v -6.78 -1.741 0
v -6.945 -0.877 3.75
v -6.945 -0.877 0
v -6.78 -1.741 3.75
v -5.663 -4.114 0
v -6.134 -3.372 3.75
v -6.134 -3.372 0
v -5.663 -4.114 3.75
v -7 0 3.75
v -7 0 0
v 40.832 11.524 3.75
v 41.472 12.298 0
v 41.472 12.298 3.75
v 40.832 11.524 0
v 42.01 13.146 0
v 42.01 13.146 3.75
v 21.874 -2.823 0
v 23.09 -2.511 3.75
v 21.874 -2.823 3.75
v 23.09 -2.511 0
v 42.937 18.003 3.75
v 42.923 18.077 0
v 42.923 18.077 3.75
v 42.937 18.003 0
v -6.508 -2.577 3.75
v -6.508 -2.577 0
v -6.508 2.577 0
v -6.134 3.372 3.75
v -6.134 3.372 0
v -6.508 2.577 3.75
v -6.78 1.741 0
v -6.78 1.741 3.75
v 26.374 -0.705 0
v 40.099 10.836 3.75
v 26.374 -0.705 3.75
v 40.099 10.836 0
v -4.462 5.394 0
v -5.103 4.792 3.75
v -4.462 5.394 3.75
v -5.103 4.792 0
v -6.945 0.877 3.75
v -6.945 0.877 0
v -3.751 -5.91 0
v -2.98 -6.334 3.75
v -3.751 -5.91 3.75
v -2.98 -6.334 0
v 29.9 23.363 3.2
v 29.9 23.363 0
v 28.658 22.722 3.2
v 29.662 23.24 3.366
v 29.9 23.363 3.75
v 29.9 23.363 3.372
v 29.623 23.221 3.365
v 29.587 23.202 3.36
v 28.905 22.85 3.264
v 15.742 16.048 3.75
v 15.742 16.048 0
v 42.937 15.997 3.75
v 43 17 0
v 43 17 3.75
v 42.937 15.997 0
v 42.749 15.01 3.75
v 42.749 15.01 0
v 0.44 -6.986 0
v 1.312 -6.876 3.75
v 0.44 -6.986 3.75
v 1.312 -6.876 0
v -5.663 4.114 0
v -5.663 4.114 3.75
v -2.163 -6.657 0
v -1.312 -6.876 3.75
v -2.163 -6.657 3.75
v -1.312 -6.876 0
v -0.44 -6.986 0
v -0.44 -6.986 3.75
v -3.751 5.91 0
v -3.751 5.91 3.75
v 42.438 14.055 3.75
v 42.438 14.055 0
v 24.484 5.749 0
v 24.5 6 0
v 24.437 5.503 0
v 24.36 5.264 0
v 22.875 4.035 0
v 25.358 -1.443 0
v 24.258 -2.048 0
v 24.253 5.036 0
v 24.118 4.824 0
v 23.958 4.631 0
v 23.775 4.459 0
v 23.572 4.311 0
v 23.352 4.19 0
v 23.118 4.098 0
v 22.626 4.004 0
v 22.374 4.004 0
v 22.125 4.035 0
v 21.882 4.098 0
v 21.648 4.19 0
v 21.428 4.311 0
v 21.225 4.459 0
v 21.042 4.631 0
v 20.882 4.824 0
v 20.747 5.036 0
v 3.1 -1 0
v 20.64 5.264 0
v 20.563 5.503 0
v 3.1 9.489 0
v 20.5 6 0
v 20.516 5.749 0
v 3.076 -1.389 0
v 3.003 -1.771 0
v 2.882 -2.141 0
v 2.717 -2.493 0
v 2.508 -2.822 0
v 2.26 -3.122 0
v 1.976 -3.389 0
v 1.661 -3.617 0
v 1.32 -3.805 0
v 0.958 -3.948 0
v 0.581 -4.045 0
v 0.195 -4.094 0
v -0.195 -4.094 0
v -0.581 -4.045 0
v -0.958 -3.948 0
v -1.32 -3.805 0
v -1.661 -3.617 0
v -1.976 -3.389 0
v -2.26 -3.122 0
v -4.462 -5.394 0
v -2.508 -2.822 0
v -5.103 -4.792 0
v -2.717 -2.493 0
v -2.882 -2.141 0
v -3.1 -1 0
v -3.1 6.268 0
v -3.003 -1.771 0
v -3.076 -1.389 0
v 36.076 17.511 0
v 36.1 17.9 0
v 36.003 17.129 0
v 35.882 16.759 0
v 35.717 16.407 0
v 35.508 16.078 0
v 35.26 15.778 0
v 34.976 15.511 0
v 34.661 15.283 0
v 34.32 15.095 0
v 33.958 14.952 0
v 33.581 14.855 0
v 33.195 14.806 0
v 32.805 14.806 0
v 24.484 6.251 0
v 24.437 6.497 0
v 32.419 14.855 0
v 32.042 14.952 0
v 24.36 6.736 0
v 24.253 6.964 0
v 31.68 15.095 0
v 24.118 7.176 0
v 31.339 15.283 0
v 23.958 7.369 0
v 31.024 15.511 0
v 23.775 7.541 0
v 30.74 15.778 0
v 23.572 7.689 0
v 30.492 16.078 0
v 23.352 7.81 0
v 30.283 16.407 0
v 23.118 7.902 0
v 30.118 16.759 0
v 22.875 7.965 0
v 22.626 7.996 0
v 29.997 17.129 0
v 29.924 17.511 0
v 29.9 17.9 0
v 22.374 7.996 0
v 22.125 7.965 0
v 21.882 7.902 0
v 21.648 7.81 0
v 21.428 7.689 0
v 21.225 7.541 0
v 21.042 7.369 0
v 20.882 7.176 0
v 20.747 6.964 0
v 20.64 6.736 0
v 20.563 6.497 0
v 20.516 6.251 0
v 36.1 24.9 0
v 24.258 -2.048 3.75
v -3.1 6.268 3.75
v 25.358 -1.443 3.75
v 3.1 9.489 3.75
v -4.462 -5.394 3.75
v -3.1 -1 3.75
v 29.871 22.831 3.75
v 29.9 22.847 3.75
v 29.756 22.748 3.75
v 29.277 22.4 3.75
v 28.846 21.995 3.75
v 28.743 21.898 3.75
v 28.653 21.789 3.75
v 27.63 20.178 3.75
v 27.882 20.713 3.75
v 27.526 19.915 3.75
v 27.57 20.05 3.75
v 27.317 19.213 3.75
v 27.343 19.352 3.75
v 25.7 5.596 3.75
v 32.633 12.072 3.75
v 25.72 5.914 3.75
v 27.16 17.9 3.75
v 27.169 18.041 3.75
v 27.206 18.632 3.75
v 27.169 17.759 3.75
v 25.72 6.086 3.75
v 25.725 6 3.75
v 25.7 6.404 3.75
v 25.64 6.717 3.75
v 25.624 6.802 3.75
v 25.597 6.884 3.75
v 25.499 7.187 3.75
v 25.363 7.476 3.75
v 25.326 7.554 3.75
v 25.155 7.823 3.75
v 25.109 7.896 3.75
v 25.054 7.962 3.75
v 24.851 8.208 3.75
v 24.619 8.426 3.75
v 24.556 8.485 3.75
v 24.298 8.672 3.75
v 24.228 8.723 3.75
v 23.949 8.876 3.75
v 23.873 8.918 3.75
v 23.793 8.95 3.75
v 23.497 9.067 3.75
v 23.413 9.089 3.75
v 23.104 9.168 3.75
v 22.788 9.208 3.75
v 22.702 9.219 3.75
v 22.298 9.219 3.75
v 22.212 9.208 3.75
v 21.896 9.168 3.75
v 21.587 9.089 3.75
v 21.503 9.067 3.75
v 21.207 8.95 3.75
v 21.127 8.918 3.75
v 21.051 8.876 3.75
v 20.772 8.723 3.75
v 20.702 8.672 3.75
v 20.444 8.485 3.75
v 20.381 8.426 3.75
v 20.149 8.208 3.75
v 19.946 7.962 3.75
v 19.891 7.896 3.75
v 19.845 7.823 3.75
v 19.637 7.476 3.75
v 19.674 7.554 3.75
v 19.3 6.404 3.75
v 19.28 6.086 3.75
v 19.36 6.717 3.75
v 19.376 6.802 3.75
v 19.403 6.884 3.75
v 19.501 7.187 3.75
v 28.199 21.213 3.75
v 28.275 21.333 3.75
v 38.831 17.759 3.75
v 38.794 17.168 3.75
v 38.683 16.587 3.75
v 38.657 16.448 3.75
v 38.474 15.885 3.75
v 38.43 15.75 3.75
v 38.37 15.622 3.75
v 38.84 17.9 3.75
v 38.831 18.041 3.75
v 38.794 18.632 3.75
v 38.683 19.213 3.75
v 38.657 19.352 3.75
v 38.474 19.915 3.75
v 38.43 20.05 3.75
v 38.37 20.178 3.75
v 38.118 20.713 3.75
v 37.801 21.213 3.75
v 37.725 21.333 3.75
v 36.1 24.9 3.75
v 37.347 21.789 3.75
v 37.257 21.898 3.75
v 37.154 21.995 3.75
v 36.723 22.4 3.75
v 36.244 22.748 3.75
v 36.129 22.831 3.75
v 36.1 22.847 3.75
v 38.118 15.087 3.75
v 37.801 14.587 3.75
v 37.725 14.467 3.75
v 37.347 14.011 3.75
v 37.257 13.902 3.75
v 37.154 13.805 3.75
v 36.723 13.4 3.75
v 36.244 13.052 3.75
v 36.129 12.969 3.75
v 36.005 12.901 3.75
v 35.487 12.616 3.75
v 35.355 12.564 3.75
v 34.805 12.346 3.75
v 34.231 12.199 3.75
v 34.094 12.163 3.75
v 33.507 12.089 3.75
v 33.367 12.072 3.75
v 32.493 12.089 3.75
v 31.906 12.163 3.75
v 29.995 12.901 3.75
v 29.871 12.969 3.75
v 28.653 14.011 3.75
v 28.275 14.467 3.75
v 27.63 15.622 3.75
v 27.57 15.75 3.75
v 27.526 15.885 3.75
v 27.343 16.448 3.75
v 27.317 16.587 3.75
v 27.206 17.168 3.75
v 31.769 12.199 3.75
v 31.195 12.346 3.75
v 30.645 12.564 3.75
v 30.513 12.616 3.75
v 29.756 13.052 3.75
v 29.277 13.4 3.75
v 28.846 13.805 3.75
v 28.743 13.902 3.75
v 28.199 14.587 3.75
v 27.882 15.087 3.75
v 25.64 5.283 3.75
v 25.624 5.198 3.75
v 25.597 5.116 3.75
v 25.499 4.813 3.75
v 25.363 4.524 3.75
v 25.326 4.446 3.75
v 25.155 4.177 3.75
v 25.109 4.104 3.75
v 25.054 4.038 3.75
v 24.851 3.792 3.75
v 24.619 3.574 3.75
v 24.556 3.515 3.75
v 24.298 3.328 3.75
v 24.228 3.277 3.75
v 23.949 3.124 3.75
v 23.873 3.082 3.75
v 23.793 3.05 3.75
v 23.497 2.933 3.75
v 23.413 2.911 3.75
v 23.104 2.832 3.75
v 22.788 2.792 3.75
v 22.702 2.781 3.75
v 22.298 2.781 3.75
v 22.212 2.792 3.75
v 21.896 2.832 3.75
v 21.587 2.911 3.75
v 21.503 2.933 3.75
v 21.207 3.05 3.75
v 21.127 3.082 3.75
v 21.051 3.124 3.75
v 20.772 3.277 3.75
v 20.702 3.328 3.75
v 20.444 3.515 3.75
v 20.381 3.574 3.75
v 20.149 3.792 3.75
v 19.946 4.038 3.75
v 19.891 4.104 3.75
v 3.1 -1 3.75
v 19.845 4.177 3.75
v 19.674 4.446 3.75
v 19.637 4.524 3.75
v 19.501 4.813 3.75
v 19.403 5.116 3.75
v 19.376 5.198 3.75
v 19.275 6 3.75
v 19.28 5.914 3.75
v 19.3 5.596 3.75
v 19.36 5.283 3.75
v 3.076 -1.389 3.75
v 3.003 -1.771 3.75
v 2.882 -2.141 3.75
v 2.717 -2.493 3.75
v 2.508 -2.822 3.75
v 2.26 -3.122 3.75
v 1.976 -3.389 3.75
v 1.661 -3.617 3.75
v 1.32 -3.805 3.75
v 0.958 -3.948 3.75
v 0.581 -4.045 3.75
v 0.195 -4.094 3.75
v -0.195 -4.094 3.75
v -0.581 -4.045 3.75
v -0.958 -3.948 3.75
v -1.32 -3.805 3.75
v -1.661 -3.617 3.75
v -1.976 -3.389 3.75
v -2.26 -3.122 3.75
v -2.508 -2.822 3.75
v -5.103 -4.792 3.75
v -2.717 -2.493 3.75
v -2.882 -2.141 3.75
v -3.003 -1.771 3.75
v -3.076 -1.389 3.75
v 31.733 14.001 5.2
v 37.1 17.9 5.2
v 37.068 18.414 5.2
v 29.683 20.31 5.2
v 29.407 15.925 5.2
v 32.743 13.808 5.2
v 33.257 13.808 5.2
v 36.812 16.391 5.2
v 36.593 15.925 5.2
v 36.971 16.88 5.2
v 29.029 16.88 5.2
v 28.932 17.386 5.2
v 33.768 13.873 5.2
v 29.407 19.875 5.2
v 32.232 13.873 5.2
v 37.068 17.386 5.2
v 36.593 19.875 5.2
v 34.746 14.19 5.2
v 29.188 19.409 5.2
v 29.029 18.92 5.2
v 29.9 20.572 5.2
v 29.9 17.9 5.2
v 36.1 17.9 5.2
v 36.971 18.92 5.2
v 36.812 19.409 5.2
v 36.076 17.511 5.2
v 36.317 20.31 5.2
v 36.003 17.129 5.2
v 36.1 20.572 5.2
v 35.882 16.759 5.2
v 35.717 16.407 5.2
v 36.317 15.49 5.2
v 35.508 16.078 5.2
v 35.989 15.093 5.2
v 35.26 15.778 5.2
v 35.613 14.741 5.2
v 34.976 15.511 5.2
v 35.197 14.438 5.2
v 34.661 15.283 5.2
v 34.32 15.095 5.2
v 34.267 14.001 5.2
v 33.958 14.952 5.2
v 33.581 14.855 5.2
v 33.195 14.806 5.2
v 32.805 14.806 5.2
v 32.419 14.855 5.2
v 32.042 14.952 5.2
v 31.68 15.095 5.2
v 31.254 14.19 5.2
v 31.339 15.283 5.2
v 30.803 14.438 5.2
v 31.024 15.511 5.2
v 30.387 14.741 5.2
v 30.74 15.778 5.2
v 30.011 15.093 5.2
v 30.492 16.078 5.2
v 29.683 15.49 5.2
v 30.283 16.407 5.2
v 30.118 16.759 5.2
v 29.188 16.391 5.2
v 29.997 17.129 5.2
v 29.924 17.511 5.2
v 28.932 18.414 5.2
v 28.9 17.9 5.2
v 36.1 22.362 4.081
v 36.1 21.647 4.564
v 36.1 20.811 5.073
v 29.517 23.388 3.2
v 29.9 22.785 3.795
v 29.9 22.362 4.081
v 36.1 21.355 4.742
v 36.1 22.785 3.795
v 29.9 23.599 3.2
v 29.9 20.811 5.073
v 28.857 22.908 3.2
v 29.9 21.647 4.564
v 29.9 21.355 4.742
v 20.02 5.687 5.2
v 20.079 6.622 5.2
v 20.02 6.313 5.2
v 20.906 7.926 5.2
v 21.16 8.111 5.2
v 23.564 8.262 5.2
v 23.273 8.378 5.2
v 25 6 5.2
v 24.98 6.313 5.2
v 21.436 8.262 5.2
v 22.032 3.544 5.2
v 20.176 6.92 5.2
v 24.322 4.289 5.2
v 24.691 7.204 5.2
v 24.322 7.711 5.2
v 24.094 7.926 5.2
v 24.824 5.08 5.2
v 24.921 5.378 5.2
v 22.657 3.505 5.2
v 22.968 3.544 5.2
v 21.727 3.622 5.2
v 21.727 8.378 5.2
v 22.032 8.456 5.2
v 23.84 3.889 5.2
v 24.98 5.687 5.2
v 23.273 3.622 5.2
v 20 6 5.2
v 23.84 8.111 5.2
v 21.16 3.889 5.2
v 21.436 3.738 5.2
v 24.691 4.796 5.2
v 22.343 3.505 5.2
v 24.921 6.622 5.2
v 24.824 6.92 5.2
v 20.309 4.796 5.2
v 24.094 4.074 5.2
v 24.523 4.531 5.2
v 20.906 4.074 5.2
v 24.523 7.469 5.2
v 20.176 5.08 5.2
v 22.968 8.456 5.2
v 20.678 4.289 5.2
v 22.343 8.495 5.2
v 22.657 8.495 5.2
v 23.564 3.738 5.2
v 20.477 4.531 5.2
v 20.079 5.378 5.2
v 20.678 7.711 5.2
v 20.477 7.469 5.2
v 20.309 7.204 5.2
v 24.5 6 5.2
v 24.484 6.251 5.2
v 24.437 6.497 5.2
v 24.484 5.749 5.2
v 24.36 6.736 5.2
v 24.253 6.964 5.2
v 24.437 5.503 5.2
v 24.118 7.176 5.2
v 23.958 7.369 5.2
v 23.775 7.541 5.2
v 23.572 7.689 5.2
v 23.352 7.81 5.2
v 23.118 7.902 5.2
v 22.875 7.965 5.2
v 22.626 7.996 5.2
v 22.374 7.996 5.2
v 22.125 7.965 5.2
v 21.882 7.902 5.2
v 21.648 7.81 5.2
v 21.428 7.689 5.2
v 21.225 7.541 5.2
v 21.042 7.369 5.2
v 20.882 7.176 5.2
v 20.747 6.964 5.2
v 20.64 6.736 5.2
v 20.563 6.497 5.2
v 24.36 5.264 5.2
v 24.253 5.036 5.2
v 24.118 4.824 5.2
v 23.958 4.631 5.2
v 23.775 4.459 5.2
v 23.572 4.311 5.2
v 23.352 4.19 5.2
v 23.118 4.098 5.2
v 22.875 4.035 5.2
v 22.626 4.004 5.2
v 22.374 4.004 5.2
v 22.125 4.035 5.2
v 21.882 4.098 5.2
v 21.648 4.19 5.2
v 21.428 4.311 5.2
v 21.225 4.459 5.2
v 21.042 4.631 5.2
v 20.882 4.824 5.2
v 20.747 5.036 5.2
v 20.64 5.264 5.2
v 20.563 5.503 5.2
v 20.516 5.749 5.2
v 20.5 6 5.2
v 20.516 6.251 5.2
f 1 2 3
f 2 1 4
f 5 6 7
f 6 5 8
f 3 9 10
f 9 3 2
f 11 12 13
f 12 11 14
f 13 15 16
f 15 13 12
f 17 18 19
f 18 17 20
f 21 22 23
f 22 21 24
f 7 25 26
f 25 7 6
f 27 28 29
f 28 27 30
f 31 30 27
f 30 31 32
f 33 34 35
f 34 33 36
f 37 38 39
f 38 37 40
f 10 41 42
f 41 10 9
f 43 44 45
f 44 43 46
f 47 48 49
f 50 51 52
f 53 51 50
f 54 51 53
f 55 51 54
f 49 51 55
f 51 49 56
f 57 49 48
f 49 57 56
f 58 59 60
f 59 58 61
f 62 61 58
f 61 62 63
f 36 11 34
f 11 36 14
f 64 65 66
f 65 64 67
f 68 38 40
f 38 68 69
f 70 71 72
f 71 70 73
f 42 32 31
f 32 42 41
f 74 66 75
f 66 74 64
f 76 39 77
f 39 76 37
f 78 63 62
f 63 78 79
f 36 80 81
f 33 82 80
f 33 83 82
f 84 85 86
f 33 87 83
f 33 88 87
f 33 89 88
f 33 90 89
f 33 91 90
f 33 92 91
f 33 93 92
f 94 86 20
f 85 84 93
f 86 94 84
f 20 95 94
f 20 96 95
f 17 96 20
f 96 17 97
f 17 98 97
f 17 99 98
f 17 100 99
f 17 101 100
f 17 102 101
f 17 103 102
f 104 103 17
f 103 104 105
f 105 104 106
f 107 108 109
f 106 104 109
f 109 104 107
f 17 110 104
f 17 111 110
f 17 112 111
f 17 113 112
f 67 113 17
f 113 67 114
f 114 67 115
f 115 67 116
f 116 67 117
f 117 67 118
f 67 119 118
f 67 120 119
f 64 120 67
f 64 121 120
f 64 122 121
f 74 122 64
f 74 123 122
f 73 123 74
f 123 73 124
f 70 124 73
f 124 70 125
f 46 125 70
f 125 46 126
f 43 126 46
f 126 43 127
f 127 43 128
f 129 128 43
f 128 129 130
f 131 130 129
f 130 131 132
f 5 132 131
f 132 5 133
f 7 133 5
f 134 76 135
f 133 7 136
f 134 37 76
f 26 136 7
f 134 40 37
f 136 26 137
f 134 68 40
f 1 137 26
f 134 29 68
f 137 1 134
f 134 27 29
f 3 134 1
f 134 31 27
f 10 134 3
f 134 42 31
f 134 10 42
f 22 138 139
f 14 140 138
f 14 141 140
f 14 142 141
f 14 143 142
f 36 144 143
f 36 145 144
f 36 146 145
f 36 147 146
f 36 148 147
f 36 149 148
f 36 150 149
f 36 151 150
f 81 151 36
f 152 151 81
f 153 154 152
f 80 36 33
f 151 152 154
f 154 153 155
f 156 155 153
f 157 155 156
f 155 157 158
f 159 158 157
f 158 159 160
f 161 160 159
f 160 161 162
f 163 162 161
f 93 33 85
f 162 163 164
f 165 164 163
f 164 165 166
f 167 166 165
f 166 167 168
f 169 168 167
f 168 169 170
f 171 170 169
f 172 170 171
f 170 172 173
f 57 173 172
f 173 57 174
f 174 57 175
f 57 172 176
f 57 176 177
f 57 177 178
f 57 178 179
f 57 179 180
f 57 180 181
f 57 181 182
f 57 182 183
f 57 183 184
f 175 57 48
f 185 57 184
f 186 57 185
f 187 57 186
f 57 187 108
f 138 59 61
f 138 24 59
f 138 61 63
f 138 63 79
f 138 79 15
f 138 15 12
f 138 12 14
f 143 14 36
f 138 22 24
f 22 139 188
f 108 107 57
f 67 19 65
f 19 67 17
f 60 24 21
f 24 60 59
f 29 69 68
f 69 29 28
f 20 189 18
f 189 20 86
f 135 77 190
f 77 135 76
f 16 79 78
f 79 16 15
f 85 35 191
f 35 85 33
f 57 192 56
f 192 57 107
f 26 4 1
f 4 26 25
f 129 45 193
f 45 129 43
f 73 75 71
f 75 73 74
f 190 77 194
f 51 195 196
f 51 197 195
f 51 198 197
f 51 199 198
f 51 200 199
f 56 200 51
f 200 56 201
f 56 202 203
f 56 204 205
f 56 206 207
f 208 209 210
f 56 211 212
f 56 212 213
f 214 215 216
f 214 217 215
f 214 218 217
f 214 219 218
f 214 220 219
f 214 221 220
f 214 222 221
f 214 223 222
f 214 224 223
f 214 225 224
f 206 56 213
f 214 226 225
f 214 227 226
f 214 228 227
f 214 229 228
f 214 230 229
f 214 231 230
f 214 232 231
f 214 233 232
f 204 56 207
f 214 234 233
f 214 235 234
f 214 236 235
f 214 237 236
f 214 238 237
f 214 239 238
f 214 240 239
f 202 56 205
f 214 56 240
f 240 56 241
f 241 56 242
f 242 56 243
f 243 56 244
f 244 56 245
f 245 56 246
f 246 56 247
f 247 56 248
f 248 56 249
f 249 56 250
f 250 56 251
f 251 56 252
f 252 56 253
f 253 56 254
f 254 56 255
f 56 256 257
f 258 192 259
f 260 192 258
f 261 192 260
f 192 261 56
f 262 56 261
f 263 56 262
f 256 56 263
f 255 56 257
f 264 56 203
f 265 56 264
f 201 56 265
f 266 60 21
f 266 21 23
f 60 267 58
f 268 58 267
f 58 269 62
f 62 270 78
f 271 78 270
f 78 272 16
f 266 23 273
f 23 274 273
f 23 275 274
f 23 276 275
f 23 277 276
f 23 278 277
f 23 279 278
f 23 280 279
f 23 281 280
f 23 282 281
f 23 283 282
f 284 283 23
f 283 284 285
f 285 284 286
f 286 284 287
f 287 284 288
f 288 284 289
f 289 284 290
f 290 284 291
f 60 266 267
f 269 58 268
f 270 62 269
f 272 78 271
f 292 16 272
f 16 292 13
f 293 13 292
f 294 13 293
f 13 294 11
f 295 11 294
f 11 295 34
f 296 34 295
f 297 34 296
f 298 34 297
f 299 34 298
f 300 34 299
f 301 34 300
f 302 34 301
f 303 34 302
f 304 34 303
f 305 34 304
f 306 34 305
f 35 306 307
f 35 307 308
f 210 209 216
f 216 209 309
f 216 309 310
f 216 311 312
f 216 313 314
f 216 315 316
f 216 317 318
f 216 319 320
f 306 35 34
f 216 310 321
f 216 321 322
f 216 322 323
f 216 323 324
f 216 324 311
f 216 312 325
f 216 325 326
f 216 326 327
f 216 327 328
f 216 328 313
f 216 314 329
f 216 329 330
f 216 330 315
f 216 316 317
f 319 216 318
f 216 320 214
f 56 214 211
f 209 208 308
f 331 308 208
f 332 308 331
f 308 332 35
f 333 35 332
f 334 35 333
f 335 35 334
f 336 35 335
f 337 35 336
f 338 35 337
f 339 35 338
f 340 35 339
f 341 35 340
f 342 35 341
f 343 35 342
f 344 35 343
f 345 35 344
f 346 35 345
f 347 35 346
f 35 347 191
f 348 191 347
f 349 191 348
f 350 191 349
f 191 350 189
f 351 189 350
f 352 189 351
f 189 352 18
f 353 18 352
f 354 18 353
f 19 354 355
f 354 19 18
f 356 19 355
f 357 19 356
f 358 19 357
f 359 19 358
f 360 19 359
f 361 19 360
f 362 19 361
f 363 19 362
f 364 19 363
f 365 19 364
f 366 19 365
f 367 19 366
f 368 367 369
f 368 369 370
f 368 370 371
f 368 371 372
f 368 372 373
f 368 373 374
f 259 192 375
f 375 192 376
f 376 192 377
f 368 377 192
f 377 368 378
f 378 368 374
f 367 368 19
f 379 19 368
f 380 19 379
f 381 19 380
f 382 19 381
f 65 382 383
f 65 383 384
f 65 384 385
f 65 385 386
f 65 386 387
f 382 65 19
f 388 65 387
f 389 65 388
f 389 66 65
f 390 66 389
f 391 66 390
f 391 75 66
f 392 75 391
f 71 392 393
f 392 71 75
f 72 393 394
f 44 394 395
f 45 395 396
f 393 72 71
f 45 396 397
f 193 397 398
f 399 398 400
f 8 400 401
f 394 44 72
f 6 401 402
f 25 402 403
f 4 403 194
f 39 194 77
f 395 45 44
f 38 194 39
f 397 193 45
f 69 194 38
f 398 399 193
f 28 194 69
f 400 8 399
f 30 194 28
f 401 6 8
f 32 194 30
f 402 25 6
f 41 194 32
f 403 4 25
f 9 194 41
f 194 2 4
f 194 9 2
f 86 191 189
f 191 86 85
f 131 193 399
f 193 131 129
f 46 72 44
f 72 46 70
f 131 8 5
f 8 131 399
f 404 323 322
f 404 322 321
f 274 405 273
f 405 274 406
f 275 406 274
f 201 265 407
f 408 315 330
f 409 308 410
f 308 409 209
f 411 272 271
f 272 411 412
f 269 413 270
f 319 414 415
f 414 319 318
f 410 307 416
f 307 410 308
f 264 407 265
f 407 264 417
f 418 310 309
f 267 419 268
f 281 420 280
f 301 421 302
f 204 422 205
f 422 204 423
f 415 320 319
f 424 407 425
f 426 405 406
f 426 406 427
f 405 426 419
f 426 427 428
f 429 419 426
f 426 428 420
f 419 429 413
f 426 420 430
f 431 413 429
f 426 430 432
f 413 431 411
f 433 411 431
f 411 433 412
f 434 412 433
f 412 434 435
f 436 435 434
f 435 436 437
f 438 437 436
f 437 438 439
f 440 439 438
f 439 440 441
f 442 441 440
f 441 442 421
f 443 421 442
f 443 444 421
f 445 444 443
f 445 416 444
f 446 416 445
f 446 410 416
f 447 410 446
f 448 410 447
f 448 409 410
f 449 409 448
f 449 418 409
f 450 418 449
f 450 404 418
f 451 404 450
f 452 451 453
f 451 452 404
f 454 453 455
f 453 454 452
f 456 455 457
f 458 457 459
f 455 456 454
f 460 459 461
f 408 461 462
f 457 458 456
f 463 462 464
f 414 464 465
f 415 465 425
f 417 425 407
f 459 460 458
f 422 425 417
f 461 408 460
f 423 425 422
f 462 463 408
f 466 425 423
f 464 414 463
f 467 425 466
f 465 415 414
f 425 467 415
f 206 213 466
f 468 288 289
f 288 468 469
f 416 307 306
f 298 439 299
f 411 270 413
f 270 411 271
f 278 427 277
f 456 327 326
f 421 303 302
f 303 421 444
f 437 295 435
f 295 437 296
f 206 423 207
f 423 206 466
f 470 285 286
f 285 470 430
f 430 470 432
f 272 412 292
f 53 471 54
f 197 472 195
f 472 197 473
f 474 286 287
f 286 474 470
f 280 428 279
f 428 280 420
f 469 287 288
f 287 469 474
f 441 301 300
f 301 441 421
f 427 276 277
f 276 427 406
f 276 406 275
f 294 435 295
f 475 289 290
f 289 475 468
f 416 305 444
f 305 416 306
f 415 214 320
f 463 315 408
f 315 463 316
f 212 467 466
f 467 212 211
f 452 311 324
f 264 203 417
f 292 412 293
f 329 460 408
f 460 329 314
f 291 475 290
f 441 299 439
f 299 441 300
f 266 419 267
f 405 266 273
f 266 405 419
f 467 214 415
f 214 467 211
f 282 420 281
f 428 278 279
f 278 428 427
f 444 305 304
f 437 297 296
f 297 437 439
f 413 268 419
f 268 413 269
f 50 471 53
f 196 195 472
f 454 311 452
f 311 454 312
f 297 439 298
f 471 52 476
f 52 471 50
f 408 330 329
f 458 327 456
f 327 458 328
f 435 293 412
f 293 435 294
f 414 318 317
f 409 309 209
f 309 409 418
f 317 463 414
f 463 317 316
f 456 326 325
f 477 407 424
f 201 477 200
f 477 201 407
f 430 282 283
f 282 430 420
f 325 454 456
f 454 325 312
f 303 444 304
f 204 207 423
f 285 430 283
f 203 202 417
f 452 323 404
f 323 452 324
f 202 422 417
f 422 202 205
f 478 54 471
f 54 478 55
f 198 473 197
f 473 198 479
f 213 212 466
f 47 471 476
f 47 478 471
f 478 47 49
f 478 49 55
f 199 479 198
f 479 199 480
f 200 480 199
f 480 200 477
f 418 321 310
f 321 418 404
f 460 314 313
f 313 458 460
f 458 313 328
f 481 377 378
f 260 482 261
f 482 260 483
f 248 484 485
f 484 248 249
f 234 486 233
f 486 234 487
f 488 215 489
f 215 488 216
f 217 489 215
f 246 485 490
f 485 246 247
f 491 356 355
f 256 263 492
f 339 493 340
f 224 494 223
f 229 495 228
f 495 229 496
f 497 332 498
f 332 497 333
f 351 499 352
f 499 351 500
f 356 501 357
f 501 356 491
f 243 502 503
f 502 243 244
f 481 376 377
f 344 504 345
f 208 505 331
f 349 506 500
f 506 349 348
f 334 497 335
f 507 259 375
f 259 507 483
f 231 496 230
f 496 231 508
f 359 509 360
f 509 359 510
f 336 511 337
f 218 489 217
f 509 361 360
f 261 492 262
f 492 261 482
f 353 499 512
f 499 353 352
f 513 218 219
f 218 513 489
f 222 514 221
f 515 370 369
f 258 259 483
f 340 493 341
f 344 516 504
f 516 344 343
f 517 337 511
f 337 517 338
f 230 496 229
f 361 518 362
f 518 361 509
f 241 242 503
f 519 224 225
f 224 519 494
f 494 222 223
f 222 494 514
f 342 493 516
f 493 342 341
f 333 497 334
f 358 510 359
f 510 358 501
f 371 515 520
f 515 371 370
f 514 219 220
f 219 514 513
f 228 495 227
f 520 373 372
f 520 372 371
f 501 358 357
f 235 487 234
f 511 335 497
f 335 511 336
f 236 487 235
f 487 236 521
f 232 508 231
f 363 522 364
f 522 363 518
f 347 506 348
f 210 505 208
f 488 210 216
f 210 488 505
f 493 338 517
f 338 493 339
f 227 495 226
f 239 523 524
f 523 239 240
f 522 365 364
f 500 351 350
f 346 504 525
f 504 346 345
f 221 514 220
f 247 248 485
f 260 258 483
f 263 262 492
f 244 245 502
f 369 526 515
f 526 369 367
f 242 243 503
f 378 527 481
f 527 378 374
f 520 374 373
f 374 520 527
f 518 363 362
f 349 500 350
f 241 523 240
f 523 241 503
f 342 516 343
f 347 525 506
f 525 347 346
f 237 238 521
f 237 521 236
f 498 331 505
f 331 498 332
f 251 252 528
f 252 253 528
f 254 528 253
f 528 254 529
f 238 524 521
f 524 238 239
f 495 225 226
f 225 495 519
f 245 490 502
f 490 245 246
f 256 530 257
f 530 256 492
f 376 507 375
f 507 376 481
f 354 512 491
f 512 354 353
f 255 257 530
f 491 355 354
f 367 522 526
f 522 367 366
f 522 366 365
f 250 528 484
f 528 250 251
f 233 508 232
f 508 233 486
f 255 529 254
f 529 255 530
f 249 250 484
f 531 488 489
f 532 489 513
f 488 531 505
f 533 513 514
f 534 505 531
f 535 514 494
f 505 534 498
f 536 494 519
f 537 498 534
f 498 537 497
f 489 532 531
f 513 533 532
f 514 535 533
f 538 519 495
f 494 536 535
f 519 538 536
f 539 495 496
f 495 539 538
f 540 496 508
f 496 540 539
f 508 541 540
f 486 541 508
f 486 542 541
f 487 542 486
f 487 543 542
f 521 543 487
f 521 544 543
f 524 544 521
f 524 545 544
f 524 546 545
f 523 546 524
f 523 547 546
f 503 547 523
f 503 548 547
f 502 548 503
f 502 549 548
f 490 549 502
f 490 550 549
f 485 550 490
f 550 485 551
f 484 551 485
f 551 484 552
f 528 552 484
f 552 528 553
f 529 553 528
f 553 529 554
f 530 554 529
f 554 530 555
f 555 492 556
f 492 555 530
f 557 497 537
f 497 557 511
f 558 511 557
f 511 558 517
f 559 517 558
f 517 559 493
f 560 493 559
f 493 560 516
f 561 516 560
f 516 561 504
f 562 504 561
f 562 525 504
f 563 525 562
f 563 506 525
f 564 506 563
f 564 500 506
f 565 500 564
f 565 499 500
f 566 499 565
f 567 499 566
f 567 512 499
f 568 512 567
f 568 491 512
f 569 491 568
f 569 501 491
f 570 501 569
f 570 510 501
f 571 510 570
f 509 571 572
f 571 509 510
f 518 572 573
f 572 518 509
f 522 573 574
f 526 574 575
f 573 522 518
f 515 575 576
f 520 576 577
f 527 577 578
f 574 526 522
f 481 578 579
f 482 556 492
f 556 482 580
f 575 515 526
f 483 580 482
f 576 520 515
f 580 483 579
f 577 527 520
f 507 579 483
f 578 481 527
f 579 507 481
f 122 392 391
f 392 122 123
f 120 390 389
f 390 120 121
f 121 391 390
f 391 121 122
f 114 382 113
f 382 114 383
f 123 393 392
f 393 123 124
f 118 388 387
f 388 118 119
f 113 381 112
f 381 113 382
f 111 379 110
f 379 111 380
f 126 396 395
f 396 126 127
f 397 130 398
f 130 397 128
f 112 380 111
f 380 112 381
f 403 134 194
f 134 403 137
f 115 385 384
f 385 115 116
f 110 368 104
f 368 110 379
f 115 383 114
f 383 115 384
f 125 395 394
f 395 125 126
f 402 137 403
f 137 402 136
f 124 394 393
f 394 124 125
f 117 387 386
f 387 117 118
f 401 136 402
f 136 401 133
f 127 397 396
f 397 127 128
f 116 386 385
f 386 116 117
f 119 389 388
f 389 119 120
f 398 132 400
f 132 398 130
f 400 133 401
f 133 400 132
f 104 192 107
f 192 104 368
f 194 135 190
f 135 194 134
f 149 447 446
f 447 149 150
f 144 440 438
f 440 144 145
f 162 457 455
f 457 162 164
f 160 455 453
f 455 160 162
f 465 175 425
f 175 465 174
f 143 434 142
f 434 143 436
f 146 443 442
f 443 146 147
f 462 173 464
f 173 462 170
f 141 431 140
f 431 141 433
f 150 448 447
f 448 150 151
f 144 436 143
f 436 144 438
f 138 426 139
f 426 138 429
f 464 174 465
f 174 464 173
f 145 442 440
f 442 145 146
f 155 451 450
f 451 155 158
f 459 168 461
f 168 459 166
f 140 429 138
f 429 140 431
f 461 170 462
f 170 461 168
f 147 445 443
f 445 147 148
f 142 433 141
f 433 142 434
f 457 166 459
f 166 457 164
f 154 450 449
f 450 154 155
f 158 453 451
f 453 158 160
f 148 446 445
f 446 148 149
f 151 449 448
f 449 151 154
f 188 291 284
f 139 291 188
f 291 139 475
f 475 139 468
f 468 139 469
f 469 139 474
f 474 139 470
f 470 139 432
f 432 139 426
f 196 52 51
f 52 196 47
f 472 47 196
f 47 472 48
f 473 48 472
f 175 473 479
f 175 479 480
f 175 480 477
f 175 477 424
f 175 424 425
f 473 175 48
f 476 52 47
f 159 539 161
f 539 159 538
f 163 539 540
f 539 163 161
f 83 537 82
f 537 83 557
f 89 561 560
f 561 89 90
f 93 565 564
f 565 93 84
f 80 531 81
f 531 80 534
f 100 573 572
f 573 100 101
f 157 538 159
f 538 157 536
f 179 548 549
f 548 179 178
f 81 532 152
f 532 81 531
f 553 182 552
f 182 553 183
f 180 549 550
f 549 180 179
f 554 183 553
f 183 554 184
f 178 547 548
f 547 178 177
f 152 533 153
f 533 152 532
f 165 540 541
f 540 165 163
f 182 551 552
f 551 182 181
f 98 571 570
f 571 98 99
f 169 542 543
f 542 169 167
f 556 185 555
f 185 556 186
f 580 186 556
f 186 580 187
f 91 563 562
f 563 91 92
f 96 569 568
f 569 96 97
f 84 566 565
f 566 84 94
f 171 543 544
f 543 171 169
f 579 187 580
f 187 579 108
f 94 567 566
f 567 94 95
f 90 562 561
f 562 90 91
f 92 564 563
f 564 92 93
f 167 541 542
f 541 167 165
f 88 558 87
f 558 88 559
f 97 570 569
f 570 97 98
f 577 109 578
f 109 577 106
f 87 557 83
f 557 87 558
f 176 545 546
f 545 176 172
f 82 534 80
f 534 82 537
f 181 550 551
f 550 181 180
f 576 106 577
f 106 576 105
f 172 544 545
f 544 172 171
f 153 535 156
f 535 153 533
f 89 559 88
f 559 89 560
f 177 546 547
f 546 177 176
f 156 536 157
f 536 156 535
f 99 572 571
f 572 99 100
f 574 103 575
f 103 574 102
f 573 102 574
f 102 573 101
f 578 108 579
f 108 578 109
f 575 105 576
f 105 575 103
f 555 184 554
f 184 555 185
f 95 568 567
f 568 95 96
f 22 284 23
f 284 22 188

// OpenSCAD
thread_rod_dia=6.2;
bearing_od=6;
bearing_id=4;
bearing_base_height=2;
bearing_base_dia=7;
bearing_base_top_dia=5;
bearing_x_dist=22.5;
bearing_y_dist=6;

lower_rod_x_dist=33;
lower_rod_y_dist=17.9;
lower_rod_outcrop_height=2;
lower_rod_outcrop_dia=13;

upper_rod_x_dist=0;
upper_rod_y_dist=-1;

idler_height = 15;
belt_width=6;
belt_thickness=2.1;
belt_dist_to_upper_rod=0;

$fn=50;
//%import_stl("/home/ckaos/GraphX/data/reprappro-Huxley/Print-Huxley/Individual-STLs/y-idler-split2.stl");

y_idler();



module y_idler(split=1)
{

	difference()
	{
		union()
		{
			idler_shape(idler_height/4);
			//lower rod outcrop
			translate([lower_rod_x_dist,lower_rod_y_dist,4.2])  	
			cylinder(h=lower_rod_outcrop_height, r1=lower_rod_outcrop_dia/2, r2=thread_rod_dia/2+1,center=true);

			//bearing base
			translate([bearing_x_dist,bearing_y_dist,4.2]) 	
			cylinder(h=bearing_base_height, r1=bearing_base_dia/2, r2=bearing_base_top_dia/2,center=true);
		}



		//uper rod hole
		translate([upper_rod_x_dist,upper_rod_y_dist,0]) 
		{	
			cylinder(h=idler_height+0.1, r=thread_rod_dia/2, center=true);
			translate([0,20,0])  cube([thread_rod_dia,40,idler_height+0.1],center=true);
		}
		//lower rod hole
		translate([lower_rod_x_dist,lower_rod_y_dist,0]) 
		{
			cylinder(h=idler_height+0.1, r=thread_rod_dia/2, center=true);
			translate([0,20,0])  cube([thread_rod_dia,40,idler_height+0.1],center=true);
		}

		translate([bearing_x_dist,bearing_y_dist,0]) cylinder(h=idler_height, r=bearing_id/2, center=true);

		//lower cutoff
		translate([51,10,0]) rotate([0,0,45])  cube([10,22,idler_height+0.1]);
	}

}

module idler_shape(thickness=1)
{
	linear_extrude(height=thickness)
		{
			hull()	
			{
				translate([35,17,0]) circle(8);
				translate([20,7,0]) circle(10);
				circle(7);
			}
		}
}
